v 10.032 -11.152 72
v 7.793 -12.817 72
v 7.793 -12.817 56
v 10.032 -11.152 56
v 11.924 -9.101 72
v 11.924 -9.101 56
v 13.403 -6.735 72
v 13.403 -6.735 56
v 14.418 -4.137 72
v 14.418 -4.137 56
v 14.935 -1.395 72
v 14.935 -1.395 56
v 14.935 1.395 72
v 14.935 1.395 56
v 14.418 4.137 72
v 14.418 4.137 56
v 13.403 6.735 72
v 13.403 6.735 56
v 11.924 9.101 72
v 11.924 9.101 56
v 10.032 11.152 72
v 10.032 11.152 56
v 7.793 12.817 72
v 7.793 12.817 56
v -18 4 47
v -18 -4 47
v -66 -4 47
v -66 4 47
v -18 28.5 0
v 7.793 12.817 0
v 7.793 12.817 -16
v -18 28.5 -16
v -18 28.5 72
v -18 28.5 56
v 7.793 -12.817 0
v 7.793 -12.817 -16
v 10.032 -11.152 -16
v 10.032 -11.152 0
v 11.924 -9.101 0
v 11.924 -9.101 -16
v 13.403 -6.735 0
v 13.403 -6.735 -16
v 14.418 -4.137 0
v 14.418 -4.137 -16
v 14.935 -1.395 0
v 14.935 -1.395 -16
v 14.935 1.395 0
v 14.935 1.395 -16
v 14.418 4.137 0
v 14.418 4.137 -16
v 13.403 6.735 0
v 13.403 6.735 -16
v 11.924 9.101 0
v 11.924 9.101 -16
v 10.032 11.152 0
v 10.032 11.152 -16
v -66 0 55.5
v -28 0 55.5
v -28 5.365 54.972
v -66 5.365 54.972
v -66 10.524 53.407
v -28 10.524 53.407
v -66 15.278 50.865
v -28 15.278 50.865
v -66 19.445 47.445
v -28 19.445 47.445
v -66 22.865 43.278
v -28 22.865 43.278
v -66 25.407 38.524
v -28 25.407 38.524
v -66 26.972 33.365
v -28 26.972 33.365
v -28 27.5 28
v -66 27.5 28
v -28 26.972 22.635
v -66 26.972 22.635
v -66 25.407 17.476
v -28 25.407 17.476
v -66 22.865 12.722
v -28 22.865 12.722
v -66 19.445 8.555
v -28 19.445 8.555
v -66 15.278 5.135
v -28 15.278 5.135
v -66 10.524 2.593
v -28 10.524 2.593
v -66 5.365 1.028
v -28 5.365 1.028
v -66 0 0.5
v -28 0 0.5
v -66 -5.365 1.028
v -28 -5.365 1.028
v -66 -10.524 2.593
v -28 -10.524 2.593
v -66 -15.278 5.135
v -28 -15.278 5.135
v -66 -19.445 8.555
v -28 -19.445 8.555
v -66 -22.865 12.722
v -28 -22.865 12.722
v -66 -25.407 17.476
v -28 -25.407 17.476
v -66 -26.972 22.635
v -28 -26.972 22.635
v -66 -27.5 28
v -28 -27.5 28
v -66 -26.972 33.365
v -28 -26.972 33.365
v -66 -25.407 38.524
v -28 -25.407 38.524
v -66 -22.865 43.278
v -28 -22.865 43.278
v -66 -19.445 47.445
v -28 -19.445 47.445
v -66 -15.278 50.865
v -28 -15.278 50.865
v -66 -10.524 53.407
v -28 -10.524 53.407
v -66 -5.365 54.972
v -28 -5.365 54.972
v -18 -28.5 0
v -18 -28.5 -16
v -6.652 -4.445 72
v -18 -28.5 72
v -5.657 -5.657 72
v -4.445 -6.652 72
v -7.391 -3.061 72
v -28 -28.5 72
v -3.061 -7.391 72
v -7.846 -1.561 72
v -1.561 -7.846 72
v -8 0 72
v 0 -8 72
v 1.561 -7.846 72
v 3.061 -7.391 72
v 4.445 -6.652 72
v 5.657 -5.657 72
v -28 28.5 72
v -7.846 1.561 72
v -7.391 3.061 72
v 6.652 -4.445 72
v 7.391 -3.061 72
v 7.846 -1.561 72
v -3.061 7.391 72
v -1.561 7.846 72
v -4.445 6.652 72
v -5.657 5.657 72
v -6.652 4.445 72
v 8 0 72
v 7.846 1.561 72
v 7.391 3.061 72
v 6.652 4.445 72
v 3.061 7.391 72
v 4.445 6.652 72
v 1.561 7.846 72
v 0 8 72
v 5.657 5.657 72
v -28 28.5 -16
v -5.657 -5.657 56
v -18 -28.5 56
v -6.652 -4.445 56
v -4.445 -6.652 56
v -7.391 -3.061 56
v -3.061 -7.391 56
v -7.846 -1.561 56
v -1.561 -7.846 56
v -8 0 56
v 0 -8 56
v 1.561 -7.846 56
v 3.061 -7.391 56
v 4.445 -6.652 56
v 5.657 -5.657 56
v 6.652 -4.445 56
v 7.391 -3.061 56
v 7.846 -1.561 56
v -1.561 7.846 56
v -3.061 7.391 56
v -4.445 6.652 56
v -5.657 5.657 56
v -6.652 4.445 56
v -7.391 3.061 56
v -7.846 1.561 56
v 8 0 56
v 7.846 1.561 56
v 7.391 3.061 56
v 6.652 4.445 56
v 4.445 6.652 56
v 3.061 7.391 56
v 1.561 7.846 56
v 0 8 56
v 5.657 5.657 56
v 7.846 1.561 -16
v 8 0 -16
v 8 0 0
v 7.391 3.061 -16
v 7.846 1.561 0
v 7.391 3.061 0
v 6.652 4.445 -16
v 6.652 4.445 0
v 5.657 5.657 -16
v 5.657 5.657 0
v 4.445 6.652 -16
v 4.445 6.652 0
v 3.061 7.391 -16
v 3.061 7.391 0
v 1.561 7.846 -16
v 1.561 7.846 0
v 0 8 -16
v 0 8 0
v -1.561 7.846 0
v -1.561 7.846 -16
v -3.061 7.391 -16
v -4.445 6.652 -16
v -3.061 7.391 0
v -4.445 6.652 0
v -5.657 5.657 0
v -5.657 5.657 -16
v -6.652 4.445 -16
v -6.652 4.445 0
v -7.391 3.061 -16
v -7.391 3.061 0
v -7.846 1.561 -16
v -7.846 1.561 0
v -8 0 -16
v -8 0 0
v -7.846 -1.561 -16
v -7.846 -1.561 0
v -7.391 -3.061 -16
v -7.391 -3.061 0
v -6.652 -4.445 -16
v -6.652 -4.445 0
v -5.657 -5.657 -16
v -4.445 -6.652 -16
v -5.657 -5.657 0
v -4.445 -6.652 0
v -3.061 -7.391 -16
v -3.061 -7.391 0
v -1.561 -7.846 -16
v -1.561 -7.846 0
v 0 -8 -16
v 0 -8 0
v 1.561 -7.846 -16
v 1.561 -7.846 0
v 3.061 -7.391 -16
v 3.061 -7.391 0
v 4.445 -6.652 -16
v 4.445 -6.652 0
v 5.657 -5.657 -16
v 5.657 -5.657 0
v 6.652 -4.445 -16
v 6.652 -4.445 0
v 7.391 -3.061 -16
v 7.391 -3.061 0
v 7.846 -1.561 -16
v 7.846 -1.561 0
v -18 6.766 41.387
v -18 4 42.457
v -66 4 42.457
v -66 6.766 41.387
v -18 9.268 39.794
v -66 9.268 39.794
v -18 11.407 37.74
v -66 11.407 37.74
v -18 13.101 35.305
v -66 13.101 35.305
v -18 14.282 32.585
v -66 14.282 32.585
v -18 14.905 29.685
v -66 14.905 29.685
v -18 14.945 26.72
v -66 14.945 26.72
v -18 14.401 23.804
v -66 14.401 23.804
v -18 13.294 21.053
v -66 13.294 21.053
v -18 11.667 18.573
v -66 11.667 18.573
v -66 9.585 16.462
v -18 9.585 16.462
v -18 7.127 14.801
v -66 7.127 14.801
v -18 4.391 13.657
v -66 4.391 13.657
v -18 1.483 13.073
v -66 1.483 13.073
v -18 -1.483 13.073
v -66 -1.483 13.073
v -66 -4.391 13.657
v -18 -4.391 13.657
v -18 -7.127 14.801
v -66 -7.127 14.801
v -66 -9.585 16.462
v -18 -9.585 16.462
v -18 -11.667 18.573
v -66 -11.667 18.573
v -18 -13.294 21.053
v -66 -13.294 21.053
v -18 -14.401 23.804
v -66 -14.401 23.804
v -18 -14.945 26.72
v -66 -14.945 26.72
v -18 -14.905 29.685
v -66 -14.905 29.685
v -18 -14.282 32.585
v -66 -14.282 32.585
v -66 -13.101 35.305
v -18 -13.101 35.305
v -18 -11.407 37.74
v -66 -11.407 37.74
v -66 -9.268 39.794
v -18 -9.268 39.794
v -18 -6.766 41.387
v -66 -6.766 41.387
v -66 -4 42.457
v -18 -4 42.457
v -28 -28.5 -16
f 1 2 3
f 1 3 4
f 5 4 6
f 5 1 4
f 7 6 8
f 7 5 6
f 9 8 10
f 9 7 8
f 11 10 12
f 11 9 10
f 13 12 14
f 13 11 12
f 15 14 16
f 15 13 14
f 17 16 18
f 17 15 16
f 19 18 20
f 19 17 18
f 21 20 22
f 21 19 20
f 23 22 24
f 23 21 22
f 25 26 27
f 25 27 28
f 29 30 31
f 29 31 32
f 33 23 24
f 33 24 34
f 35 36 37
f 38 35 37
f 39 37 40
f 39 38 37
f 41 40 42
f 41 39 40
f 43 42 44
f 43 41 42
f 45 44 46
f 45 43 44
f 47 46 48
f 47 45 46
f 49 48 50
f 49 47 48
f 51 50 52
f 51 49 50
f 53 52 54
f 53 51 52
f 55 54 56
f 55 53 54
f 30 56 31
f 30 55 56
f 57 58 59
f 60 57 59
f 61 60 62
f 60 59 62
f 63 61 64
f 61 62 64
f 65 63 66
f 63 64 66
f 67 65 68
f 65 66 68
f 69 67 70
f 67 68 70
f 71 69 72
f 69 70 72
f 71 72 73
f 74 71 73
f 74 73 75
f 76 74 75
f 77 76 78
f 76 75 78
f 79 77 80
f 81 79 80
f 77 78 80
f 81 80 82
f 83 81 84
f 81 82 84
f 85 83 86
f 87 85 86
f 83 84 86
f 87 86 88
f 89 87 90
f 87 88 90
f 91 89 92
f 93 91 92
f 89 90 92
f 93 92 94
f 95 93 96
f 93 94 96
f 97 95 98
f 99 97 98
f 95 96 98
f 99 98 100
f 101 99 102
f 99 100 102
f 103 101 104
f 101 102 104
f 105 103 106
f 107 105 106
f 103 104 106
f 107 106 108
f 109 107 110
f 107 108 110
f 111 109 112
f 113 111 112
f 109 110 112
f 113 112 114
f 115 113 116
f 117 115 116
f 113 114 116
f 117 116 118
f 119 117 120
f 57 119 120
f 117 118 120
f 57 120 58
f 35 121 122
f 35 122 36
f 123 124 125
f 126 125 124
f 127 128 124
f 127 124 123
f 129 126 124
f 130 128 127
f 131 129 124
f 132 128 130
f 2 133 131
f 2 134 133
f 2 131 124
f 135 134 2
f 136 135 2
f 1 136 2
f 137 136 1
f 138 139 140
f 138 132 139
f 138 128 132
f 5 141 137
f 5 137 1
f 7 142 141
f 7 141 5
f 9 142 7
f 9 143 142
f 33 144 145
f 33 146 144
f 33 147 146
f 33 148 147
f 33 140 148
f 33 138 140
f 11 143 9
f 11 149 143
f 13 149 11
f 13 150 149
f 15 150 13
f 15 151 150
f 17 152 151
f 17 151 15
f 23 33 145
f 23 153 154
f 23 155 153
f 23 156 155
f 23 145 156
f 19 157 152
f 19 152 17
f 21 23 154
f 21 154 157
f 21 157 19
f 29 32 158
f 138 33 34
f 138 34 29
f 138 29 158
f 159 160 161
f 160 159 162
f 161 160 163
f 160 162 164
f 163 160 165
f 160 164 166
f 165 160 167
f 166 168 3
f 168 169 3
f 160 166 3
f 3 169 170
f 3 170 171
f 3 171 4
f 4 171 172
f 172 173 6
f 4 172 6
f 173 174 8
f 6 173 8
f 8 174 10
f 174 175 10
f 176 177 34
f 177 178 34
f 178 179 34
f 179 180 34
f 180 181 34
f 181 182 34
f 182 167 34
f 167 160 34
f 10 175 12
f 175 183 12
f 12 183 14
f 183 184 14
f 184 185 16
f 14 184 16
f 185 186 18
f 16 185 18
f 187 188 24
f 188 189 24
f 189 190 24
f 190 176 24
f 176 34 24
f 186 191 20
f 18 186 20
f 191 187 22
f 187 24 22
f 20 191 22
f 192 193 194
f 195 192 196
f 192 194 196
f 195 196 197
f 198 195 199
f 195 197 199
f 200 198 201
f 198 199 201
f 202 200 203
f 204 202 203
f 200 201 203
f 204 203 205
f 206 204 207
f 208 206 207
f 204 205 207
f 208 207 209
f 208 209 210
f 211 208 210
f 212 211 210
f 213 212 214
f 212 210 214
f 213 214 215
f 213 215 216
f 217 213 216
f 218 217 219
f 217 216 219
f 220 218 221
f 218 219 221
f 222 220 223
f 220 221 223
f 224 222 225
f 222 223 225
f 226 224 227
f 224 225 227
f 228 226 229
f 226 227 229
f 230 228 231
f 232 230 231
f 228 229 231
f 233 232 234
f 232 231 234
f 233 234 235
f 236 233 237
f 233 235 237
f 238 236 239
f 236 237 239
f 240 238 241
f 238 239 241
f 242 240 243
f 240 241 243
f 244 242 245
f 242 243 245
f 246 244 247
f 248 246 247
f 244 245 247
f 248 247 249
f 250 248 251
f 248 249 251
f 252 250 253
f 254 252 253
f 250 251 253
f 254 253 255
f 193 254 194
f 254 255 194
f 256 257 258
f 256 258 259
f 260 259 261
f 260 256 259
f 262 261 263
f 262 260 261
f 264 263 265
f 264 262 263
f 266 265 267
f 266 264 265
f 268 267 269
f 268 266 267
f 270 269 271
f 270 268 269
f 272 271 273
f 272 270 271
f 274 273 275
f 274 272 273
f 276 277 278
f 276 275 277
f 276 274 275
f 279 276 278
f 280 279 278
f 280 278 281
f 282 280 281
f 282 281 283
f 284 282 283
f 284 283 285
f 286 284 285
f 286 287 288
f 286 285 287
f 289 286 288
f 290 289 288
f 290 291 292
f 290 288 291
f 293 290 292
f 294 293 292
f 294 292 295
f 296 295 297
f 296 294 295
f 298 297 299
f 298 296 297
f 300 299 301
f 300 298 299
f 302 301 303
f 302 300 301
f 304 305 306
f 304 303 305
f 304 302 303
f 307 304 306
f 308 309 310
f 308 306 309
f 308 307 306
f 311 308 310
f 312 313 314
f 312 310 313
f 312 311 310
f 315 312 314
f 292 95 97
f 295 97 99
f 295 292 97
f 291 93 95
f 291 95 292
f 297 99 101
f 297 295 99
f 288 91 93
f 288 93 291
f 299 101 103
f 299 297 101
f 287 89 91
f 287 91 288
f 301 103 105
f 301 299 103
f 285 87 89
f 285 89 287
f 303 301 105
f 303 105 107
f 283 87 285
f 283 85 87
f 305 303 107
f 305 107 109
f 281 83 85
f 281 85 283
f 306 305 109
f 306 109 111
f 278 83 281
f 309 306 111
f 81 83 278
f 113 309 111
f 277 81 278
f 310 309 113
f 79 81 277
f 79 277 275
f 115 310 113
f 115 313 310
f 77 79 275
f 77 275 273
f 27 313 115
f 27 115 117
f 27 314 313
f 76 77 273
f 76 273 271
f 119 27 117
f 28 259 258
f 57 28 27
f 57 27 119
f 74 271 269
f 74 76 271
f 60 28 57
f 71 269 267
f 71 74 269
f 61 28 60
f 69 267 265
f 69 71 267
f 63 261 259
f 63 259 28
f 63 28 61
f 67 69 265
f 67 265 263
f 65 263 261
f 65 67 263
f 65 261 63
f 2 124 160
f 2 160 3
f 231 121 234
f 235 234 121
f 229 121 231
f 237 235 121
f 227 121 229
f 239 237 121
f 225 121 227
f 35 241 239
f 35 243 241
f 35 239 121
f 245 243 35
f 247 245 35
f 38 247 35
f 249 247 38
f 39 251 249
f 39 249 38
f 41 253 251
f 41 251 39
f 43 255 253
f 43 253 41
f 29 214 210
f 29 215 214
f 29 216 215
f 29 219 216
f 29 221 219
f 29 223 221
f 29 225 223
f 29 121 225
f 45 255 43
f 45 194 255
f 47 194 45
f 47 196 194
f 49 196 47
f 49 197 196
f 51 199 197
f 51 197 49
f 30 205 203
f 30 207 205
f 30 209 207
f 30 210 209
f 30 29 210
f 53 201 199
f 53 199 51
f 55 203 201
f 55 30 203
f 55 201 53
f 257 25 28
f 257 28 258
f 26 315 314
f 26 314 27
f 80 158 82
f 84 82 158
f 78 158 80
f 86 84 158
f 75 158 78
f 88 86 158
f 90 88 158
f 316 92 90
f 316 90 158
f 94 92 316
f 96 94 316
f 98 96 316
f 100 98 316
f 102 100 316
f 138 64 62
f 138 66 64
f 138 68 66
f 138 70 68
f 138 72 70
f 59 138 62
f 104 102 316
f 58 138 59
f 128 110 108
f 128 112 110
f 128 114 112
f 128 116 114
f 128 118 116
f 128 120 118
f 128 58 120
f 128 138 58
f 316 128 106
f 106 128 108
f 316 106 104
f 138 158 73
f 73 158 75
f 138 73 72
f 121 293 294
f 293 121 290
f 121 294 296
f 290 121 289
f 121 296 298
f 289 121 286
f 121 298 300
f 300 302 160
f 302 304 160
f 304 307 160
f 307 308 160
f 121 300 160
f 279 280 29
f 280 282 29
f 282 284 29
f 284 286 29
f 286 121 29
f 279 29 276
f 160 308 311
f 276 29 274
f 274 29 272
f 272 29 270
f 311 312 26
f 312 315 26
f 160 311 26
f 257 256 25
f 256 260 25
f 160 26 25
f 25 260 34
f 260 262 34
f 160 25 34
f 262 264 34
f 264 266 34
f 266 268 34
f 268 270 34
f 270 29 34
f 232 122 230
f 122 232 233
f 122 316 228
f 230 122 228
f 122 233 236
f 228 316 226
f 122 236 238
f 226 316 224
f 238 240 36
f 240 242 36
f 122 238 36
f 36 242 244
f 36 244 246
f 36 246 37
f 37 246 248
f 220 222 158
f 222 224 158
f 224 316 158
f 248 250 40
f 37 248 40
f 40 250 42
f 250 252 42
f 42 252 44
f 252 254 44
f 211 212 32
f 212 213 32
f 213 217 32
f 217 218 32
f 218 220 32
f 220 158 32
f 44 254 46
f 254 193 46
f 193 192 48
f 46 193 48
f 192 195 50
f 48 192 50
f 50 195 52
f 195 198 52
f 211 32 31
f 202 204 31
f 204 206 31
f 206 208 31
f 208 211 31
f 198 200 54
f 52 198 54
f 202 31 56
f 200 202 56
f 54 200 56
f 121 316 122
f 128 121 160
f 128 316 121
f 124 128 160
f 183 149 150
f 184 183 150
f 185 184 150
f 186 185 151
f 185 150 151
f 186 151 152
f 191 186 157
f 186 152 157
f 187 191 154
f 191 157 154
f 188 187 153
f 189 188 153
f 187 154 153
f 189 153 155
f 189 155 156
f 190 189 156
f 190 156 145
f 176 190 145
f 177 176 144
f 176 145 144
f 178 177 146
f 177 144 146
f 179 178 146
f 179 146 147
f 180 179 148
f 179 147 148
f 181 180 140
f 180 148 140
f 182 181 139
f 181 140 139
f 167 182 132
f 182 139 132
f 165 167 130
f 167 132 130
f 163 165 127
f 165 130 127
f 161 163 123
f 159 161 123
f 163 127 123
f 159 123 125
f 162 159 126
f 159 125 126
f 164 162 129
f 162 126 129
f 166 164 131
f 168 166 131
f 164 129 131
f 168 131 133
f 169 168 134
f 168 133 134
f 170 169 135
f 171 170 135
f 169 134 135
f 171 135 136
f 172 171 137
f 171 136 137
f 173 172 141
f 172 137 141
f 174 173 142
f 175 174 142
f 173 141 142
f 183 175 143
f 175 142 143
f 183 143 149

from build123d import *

# Parameters (mm, degrees)
SKETCH1_R           = 8
BOSS_EXTRUDE1_DEPTH = 16
SKETCH2_W           = 88
SKETCH2_H           = 57
BOSS_EXTRUDE2_DEPTH = 10
SKETCH3_R           = 8
BOSS_EXTRUDE3_DEPTH = 16
SKETCH4_R           = 27.5
BOSS_EXTRUDE4_DEPTH = 38
CUT_EXTRUDE2_DEPTH  = 92.105707834


with BuildPart() as part:
    # Sketch1 → Boss-Extrude1 (new body)
    with BuildSketch(Plane.XY):
        with BuildLine():
            Line((-28, 28.5), (-28, -28.5))
            Line((-28, -28.5), (-18, -28.5))
            Line((-18, -28.5), (7.793097747, -12.816693314))
            ThreePointArc((7.793097747, -12.816693314), (15, 0), (7.793097747, 12.816693314))
            Line((7.793097747, 12.816693314), (-18, 28.5))
            Line((-18, 28.5), (-28, 28.5))
        make_face()
        Circle(SKETCH1_R, mode=Mode.SUBTRACT)
    extrude(amount=-BOSS_EXTRUDE1_DEPTH)

    # Sketch2 → Boss-Extrude2 (add)
    with BuildSketch(Plane.ZY.offset(28)):
        with Locations((28, 0)):
            Rectangle(SKETCH2_W, SKETCH2_H)
    extrude(amount=-BOSS_EXTRUDE2_DEPTH)

    # Sketch3 → Boss-Extrude3 (add)
    with BuildSketch(Plane.XY.offset(72)):
        with BuildLine():
            Line((7.793097747, 12.816693314), (-18, 28.5))
            Line((-18, 28.5), (-18, -28.5))
            Line((-18, -28.5), (7.793097747, -12.816693314))
            ThreePointArc((7.793097747, -12.816693314), (15, 0), (7.793097747, 12.816693314))
        make_face()
        Circle(SKETCH3_R, mode=Mode.SUBTRACT)
    extrude(amount=-BOSS_EXTRUDE3_DEPTH)

    # Sketch4 → Boss-Extrude4 (add)
    with BuildSketch(Plane.ZY.offset(28)):
        with Locations((28, 0)):
            Circle(SKETCH4_R)
        with BuildLine():
            Line((47, 4), (47, -4))
            Line((47, -4), (42.456832295, -4))
            ThreePointArc((42.456832295, -4), (13, 0), (42.456832295, 4))
            Line((42.456832295, 4), (47, 4))
        make_face(mode=Mode.SUBTRACT)
    extrude(amount=BOSS_EXTRUDE4_DEPTH)

    # Sketch5 → Cut-Extrude2 (cut, through all)
    with BuildSketch(Plane(origin=(-18, 0, 0), x_dir=(0, 0, -1), z_dir=(1, 0, 0))):
        with BuildLine():
            Line((-47, -4), (-47, 4))
            Line((-47, 4), (-42.456832295, 4))
            ThreePointArc((-42.456832295, 4), (-13, 0), (-42.456832295, -4))
            Line((-42.456832295, -4), (-47, -4))
        make_face()
    extrude(amount=-CUT_EXTRUDE2_DEPTH, mode=Mode.SUBTRACT)


solid = part.part
